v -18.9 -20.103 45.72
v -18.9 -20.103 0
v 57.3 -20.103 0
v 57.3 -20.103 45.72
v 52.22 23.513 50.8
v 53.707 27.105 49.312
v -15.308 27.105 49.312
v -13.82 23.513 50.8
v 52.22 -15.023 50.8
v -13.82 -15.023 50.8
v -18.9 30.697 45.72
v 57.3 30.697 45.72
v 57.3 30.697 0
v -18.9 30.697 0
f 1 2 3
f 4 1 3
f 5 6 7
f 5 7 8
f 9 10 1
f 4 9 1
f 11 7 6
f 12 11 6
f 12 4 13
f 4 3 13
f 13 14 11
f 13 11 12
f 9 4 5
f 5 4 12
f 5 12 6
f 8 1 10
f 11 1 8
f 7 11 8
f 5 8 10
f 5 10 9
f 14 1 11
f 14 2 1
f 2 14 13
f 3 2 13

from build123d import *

# Parameters (mm, degrees)
F0_W        = 76.2
F0_H        = 50.8
F1_DEPTH    = 50.8
F2_SIZE     = 5.08
F3_T1_DEPTH = 71.8482991577
F3_T3_DEPTH = 87.6662799398
F3_T5_DEPTH = 102.3282991577


# Not quite as in the source:
# - a fillet or chamfer that OpenCascade refuses, or shapes differently, is made with other operations: its cross-section is extruded or revolved along the edge and cut away or added


with BuildPart() as f1:
    # F0 (on Top) → F1 (new body)
    with BuildSketch(Plane.XY):
        with Locations((19.1995975337, 5.2968291566)):
            Rectangle(F0_W, F0_H)
    extrude(amount=F1_DEPTH)

    # F2
    f2_edges = [f1.edges().sort_by_distance(p)[0] for p in [
        (19.199598, 30.696829, 50.8),
    ]]
    chamfer(f2_edges, length=F2_SIZE)

    # F3: chamfer of 5.08 on 4 edges, made by hand

    # F3_s2 → F3_t1 (cut)
    with BuildSketch(Plane.XZ.offset(-38.6809787354)):
        Polygon((-18.9004024663, 45.72), (-13.8204024663, 50.8), (-18.9004024663, 50.8), align=None)
        Polygon((57.2995975337, 45.72), (52.2195975337, 50.8), (57.2995975337, 50.8), align=None)
    extrude(amount=F3_T1_DEPTH, mode=Mode.SUBTRACT)

    # F3_s4 → F3_t3 (cut)
    with BuildSketch(Plane.YZ.offset(-24.6335424362)):
        Polygon((27.1047267081, 49.3121024484), (23.5126242597, 50.8), (25.6168291566, 50.8), align=None)
    extrude(amount=F3_T3_DEPTH, mode=Mode.SUBTRACT)

    # F3_s6 → F3_t5 (cut)
    with BuildSketch(Plane.YZ.offset(-31.9645520452)):
        Polygon((-15.0231708434, 50.8), (-20.1031708434, 45.72), (-20.1031708434, 50.8), align=None)
    extrude(amount=F3_T5_DEPTH, mode=Mode.SUBTRACT)


solid = f1.part
